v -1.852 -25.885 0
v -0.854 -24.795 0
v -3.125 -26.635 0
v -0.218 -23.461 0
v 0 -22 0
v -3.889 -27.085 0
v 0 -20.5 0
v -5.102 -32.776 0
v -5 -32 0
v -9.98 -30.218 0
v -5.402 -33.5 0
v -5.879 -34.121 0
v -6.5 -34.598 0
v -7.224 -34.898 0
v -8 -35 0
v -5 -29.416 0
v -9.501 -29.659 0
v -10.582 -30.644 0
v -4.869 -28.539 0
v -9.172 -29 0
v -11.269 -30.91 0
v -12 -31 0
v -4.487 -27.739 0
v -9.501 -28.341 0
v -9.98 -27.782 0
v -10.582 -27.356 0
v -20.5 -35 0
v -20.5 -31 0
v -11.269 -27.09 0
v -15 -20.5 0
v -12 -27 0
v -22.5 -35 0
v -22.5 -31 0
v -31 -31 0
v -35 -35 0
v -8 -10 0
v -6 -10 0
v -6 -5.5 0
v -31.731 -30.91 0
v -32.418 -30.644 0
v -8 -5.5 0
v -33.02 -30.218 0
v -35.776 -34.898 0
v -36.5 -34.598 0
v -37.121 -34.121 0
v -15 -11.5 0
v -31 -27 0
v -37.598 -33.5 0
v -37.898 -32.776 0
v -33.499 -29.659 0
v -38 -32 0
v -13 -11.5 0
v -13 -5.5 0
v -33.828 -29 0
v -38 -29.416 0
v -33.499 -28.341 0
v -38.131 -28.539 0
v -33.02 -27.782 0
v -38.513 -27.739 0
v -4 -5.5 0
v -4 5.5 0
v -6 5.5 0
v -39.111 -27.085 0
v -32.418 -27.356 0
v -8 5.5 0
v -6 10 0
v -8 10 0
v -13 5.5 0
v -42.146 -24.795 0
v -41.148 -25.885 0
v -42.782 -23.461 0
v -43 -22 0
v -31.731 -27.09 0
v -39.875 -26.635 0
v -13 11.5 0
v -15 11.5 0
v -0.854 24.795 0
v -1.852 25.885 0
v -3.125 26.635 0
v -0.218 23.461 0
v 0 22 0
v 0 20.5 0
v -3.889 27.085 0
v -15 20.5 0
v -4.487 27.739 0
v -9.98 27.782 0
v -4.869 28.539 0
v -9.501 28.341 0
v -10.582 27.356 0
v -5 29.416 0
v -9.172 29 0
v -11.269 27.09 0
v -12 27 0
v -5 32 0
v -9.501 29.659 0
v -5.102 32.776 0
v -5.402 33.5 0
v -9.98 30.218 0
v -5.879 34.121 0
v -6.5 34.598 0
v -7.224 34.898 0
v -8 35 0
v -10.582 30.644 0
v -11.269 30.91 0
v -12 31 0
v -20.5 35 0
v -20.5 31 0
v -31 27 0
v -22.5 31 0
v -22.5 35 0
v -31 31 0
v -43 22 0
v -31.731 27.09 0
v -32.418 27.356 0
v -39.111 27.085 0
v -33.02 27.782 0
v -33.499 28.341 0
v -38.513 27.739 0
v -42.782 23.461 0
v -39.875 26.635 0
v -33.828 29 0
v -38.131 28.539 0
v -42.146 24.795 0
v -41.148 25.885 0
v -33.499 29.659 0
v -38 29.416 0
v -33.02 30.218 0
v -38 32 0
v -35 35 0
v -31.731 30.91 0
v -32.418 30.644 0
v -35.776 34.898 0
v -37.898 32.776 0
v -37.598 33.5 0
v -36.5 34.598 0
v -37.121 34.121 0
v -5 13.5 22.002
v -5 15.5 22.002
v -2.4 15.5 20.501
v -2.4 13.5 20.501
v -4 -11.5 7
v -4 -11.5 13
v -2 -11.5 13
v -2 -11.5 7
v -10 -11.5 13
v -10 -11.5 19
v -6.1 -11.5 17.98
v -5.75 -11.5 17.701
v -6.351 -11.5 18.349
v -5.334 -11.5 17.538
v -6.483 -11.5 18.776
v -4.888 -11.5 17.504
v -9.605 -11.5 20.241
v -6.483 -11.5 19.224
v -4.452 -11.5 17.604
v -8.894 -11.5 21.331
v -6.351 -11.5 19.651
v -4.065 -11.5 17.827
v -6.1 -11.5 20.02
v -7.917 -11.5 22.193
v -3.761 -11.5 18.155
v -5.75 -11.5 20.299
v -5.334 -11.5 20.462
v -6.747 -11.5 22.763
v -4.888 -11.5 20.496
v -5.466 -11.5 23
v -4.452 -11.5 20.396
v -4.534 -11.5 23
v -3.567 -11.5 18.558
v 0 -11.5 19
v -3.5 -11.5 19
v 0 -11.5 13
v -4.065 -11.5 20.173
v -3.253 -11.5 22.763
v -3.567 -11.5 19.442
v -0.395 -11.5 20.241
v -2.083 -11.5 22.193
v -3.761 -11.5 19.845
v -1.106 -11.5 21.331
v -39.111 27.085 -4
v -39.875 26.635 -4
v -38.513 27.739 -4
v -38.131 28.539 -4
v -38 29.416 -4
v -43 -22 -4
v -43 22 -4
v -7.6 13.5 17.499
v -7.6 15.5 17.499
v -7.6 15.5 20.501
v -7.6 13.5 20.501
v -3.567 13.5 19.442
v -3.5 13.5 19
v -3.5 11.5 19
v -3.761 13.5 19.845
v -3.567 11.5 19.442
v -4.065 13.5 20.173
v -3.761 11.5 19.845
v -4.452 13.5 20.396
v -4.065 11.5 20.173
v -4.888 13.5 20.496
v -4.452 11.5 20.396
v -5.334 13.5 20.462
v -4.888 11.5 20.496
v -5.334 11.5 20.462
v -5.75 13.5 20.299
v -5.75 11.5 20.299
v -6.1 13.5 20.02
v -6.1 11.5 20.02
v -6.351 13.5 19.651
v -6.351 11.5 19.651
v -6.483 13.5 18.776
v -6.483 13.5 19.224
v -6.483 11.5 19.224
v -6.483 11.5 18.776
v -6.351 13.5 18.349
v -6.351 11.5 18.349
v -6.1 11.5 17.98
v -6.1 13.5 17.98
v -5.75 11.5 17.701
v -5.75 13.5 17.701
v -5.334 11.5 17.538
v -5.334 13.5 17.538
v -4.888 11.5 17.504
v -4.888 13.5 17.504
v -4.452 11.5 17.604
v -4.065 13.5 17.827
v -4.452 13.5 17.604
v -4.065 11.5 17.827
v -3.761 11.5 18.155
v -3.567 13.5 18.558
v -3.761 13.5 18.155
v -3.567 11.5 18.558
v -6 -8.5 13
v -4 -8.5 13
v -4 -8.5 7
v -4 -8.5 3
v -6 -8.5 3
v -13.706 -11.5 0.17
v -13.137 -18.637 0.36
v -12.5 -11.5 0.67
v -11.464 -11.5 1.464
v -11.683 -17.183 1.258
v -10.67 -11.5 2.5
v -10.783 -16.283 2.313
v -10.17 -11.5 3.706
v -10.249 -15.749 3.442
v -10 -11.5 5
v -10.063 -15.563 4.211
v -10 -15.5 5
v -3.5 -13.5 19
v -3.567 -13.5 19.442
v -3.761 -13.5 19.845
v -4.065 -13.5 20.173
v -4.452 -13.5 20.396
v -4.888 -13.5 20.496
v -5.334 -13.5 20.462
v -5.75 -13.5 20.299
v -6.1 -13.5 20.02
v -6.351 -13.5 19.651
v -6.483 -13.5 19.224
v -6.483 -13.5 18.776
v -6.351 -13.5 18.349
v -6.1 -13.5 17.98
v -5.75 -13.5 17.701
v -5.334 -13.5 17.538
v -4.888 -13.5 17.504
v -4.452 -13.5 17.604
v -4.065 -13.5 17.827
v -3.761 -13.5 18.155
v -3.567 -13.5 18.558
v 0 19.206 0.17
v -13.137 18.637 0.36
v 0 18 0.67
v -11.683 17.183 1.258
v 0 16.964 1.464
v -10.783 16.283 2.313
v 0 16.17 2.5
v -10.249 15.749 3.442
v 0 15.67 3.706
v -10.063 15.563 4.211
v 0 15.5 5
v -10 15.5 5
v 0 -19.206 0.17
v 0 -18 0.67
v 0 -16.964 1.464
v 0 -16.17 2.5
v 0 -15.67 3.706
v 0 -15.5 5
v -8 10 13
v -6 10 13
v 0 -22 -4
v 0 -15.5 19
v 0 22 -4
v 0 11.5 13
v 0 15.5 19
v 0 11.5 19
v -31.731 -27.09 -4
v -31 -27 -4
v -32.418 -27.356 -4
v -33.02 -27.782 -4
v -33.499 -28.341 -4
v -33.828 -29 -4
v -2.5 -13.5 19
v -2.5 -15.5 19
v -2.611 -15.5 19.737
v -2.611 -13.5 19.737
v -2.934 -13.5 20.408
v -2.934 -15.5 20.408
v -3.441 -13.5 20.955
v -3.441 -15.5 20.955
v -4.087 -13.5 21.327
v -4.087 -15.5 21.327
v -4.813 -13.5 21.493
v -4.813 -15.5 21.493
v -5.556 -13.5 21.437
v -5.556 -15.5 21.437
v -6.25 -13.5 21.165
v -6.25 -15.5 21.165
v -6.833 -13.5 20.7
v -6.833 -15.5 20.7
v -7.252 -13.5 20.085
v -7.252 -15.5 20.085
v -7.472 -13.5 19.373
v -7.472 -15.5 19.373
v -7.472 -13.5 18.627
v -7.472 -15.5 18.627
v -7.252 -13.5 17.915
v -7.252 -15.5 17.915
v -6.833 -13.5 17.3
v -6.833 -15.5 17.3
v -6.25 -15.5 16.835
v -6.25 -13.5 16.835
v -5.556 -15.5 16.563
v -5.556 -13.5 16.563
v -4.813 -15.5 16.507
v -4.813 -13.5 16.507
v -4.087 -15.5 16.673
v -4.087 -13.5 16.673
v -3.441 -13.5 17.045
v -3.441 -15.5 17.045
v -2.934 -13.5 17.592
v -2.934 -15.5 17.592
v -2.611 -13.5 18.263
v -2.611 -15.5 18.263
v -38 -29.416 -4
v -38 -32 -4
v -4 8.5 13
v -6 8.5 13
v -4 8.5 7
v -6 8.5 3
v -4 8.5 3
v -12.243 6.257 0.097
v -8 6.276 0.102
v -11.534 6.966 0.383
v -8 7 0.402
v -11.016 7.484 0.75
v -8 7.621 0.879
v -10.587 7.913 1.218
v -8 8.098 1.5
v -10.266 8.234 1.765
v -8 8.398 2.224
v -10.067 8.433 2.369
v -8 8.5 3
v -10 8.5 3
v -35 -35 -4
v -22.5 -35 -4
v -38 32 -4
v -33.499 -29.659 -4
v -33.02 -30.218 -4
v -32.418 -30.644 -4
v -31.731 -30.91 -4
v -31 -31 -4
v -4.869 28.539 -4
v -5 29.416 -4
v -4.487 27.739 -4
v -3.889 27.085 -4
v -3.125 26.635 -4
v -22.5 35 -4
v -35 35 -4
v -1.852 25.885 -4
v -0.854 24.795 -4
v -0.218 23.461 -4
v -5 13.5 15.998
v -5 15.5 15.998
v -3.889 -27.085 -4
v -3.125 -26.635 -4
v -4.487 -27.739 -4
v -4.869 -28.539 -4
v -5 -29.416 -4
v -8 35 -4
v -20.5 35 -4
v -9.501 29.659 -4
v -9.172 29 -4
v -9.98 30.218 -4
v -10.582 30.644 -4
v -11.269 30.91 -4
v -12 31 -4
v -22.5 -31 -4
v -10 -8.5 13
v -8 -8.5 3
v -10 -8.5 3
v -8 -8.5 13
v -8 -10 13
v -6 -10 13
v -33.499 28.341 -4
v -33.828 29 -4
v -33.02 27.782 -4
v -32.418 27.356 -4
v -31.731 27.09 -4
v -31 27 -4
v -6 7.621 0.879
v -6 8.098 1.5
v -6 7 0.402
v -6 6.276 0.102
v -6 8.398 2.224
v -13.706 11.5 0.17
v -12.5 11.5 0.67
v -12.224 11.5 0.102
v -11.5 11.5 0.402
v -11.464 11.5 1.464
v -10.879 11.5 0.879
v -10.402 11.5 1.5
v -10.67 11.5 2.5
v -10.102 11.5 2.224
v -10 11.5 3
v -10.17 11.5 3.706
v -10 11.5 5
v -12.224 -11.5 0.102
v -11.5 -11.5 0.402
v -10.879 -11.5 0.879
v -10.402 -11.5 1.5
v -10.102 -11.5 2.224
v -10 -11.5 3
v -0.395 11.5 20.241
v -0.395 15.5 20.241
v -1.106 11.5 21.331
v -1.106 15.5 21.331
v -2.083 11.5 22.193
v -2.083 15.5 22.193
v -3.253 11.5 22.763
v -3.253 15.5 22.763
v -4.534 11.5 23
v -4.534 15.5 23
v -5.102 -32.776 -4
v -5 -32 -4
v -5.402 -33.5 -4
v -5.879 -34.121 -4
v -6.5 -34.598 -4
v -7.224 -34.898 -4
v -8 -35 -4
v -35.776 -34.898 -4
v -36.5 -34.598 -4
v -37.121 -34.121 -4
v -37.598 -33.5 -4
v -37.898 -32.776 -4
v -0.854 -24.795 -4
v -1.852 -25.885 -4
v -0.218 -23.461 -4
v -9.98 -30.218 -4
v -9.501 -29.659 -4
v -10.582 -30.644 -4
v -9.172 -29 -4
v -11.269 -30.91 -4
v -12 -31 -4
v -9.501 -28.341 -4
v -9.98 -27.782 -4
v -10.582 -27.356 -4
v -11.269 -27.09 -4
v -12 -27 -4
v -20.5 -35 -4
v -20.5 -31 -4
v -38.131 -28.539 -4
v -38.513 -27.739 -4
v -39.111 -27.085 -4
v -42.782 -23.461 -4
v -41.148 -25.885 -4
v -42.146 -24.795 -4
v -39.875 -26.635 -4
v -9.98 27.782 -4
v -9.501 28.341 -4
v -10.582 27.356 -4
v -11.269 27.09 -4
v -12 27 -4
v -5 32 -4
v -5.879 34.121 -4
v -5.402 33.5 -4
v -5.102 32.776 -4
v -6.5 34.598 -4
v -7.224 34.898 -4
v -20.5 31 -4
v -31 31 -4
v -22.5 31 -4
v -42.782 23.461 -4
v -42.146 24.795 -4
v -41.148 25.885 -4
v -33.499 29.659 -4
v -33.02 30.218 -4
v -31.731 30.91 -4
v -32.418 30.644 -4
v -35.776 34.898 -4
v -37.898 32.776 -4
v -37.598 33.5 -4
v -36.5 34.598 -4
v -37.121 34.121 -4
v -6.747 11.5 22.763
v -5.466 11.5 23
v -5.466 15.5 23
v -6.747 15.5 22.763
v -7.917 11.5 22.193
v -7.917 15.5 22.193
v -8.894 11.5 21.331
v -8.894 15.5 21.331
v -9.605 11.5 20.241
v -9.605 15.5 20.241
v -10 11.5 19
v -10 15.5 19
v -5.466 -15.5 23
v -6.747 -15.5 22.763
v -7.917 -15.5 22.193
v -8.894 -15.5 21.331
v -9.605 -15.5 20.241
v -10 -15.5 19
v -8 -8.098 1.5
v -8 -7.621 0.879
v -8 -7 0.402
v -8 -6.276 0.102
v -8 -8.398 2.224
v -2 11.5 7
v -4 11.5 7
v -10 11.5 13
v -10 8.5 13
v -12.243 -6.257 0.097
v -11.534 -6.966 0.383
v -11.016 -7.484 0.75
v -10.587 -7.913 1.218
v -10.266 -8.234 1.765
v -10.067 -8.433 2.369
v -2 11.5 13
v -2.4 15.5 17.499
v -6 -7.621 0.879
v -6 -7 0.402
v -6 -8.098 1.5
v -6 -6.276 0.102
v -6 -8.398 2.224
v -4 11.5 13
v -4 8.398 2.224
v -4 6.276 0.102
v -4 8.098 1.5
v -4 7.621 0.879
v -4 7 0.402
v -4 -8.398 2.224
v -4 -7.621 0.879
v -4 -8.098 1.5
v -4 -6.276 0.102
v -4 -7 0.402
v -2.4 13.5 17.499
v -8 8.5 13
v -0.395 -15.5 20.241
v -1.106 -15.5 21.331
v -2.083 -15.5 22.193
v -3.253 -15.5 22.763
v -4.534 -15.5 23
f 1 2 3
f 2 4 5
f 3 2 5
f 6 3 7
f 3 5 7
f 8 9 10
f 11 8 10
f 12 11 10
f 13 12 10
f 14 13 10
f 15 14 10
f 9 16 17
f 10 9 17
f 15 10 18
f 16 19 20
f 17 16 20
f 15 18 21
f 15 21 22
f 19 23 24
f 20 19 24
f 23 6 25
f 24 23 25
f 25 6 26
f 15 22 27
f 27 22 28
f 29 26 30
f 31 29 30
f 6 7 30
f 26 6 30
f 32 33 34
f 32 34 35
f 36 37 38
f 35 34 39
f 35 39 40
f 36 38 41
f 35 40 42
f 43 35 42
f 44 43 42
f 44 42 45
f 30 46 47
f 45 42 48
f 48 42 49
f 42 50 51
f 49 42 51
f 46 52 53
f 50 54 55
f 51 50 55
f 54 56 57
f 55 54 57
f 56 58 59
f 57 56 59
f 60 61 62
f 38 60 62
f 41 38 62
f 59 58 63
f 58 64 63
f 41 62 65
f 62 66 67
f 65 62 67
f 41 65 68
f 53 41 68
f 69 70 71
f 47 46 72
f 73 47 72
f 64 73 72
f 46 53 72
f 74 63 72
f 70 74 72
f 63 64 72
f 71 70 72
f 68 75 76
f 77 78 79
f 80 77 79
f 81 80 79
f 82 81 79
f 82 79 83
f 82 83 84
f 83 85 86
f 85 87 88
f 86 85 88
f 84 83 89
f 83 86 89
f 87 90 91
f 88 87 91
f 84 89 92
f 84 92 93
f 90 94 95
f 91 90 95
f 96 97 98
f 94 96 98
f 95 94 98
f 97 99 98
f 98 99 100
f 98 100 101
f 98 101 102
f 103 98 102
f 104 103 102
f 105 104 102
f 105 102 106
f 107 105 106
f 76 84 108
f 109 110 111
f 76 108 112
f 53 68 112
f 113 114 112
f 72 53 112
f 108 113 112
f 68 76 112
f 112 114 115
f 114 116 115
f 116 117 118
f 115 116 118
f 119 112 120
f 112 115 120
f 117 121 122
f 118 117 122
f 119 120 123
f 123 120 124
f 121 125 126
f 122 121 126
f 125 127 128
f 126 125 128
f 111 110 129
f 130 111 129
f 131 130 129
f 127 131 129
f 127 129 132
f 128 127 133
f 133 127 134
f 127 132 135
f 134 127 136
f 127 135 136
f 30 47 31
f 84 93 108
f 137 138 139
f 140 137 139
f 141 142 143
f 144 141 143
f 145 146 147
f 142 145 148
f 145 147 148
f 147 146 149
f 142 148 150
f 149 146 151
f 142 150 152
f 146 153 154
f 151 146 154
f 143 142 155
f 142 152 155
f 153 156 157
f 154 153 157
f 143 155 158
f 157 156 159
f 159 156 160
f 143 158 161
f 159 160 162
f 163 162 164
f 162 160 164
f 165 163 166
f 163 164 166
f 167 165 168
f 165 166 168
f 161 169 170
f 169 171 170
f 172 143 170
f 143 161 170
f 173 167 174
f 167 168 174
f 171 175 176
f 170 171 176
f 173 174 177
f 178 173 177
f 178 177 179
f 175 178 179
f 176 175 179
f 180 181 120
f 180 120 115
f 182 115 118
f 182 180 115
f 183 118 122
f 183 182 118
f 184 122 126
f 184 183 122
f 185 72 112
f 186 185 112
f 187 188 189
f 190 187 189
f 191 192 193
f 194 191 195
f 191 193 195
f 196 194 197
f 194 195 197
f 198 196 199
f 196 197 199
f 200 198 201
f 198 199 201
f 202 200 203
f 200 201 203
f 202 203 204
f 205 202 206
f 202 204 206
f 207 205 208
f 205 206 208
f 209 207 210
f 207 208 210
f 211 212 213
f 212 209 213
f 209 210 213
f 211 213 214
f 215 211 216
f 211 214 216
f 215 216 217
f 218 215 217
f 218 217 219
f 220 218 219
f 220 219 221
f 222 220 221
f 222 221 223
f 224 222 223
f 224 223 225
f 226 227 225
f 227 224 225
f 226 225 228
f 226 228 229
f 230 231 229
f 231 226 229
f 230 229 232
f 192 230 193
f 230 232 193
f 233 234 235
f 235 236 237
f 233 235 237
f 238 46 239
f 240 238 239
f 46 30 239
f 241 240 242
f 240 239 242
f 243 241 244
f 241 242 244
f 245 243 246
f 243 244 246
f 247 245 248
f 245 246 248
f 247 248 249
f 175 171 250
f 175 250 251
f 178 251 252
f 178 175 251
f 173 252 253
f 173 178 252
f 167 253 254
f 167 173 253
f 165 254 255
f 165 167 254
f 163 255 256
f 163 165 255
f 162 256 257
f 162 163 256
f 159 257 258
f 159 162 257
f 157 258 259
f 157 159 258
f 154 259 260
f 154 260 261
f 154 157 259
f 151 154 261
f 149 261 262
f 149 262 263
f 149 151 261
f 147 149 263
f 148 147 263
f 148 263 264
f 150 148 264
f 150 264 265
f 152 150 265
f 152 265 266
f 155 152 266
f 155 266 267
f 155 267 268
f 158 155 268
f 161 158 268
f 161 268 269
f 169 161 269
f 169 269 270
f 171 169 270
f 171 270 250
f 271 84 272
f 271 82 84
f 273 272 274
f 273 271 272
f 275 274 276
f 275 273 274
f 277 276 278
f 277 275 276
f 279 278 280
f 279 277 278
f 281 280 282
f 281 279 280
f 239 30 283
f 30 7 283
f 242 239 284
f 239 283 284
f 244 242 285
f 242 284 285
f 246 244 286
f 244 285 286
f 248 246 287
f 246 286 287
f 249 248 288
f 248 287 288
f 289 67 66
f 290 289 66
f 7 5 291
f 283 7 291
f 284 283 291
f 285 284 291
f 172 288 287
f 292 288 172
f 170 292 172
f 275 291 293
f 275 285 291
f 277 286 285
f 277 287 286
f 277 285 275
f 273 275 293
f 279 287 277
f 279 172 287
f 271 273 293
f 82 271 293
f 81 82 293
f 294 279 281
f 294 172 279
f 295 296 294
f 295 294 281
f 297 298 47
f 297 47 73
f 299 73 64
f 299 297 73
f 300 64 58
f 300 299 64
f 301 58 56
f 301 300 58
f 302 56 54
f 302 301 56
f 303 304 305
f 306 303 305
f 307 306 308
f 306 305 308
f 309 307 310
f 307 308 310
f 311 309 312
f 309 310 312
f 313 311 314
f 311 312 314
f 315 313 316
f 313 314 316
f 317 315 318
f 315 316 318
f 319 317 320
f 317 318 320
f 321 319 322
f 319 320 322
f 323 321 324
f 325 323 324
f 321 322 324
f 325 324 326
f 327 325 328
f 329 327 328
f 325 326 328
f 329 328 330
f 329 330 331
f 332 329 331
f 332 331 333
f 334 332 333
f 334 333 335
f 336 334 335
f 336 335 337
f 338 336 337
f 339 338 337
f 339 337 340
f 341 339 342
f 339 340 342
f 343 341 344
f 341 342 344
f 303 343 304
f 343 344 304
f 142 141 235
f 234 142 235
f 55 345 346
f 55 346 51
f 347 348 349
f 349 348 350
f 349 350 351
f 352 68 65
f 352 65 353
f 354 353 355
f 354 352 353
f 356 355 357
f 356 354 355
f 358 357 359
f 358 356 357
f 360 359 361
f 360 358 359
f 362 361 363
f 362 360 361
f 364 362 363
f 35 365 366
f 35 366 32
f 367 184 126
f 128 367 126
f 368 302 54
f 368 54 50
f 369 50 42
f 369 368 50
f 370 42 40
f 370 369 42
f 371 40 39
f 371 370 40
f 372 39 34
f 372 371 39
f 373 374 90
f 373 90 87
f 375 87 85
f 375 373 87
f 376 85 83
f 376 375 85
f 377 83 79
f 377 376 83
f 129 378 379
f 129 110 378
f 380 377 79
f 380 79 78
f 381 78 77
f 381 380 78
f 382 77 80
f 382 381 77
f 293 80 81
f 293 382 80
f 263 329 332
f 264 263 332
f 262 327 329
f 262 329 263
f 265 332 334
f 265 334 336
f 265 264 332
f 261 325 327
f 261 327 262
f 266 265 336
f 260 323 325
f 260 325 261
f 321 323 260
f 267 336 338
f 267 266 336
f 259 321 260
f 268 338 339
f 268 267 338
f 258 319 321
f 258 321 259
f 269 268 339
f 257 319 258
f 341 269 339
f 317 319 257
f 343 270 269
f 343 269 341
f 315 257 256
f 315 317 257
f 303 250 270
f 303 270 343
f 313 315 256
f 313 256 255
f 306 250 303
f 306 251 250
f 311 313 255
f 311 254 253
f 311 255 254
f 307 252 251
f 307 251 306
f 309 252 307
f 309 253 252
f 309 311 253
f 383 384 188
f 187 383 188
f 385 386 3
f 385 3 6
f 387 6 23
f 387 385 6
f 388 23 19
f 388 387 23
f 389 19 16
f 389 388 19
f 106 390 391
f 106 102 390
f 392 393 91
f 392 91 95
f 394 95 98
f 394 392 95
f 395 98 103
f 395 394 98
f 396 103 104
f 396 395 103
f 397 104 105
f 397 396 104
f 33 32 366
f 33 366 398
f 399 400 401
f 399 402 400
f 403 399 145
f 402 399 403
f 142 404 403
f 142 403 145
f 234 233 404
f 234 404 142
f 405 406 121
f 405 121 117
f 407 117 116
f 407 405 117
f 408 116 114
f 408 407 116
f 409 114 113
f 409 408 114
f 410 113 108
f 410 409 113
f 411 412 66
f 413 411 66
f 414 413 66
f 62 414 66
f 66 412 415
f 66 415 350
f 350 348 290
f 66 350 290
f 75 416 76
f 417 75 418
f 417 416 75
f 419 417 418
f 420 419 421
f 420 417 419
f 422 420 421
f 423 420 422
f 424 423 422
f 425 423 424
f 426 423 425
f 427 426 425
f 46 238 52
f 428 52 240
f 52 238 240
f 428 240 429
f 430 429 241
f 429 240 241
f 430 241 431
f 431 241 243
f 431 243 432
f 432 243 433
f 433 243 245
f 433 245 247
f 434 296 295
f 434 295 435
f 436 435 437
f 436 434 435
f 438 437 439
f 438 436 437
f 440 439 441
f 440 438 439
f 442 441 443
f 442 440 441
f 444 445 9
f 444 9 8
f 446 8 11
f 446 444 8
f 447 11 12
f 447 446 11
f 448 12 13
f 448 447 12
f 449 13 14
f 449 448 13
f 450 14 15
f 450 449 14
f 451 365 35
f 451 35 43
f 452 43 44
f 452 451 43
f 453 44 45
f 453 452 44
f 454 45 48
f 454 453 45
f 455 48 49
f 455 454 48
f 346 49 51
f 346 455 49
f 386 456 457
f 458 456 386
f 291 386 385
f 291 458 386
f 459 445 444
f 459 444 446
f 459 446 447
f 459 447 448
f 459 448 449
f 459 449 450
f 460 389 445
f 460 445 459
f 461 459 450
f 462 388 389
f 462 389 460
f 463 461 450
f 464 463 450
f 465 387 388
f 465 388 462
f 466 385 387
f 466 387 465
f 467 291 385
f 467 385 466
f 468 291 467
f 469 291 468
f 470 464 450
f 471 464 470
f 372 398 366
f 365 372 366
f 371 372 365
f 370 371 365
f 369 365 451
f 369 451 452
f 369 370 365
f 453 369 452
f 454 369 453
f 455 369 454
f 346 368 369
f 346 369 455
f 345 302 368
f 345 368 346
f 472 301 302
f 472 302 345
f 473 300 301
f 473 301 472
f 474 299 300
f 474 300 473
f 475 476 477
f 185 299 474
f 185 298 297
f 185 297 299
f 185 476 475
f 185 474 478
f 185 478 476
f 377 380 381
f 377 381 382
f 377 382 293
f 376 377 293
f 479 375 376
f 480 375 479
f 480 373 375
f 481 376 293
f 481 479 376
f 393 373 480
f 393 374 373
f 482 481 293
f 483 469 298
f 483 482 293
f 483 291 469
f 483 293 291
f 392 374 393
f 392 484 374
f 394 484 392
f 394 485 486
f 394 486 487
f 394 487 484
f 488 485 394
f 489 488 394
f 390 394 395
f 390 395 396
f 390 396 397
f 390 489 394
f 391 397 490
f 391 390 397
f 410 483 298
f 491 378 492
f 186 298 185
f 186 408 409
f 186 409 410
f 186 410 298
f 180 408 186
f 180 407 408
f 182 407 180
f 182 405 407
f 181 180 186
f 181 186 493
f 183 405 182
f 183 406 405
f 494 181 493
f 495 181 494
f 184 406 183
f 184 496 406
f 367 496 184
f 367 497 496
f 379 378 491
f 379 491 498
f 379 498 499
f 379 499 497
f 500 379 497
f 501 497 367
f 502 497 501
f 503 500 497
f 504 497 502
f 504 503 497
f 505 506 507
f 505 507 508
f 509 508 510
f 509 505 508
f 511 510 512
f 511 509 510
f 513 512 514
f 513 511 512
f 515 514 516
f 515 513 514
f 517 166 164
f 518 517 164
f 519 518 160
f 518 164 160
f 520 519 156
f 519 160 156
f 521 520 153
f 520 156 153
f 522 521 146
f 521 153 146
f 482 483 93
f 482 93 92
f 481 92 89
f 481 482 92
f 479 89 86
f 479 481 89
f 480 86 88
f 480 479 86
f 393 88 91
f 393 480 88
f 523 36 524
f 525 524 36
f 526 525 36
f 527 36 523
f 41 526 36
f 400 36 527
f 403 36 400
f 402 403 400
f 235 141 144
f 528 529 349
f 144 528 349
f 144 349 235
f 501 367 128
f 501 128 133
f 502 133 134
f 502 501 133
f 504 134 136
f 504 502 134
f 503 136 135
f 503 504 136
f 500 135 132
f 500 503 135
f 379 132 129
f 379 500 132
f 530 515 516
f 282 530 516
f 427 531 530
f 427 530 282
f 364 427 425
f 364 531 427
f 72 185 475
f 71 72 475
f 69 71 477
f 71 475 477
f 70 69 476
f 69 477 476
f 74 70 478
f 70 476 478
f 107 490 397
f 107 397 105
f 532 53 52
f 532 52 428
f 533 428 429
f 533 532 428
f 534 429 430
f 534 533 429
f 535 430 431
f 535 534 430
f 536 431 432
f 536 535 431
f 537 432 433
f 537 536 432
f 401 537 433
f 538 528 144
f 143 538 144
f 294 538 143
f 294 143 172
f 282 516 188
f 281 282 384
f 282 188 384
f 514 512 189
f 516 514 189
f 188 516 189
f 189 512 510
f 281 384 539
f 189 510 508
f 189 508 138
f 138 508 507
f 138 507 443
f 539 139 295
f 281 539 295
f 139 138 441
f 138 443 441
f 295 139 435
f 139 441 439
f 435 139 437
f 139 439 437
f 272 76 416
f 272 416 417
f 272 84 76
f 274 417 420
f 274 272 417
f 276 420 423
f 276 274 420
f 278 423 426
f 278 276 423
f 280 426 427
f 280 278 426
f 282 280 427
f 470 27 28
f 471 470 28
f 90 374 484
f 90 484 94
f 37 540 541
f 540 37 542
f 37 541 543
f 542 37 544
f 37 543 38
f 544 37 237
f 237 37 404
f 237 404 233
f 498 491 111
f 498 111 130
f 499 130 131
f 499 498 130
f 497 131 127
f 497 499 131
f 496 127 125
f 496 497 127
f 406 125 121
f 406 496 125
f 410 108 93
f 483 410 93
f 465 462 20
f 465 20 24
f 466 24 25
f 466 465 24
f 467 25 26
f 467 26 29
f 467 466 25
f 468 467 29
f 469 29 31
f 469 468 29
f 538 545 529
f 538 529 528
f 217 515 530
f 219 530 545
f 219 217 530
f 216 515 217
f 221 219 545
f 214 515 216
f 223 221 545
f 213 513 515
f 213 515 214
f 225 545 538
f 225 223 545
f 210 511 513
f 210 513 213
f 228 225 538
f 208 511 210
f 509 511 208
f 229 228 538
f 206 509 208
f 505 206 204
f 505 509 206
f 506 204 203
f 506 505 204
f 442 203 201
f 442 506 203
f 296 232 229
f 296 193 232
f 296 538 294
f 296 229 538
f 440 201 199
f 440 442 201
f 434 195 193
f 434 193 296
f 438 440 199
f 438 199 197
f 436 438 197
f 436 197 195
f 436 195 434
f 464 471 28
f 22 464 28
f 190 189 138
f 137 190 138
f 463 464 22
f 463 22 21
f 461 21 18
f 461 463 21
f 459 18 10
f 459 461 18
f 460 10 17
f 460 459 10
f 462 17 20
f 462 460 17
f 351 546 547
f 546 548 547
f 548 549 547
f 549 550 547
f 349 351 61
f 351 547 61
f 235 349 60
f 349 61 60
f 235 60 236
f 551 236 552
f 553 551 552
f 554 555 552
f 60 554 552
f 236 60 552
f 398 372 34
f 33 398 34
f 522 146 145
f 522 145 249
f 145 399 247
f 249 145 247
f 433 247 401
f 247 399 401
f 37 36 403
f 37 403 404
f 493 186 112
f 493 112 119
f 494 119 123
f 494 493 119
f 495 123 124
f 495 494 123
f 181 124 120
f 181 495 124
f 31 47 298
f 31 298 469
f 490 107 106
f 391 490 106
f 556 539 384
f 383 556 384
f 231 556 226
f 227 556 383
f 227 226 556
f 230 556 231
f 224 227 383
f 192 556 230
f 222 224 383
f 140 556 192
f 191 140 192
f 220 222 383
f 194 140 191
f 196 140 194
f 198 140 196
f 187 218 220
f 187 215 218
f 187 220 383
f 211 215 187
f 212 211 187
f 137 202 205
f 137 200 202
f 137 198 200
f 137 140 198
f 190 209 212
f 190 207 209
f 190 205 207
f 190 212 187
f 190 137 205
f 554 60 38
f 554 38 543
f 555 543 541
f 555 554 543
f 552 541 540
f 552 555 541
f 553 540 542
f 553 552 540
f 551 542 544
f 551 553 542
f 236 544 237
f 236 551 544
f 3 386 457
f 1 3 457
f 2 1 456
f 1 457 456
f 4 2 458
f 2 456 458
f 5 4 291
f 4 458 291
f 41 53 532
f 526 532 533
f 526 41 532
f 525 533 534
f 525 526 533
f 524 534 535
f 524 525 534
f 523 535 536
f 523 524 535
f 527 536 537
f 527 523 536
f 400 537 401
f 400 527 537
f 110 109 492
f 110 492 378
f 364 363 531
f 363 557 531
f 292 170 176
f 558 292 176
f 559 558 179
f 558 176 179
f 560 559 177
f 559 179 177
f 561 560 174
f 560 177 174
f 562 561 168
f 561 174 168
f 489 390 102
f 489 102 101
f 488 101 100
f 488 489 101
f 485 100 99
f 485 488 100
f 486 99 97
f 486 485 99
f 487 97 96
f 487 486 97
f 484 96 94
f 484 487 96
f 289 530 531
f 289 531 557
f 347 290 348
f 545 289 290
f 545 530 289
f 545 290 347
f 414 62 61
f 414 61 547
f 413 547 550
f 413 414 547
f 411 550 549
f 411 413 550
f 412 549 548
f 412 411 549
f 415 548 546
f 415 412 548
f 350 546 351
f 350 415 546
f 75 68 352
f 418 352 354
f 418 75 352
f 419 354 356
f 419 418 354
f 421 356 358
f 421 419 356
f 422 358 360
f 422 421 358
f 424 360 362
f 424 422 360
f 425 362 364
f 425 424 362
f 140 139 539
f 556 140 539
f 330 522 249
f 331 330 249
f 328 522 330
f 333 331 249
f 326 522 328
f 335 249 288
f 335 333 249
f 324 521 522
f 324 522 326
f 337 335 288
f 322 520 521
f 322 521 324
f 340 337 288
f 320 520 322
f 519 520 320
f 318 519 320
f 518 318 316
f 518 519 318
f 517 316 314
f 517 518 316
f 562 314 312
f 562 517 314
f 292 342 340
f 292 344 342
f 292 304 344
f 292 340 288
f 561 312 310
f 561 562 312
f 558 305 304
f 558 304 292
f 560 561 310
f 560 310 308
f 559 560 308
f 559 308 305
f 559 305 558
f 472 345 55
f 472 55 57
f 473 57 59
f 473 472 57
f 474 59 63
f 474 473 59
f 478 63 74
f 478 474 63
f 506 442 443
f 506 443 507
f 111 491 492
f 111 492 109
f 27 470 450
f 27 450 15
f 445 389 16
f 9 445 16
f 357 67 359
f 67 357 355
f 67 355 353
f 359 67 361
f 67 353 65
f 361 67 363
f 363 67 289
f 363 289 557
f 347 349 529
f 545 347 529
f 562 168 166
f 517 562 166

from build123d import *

# Parameters (mm, degrees)
F1_R          = 1.5
F2_DEPTH      = 4
F4_W          = 43
F4_H          = 54
F5_DEPTH      = 4
F6_R          = 5
F7_W          = 4
F7_H          = 4
F8_DEPTH      = 8
F8_DEPTH_BACK = 62
F9_W          = 4
F9_H          = 4
F10_DEPTH     = 25
F11_W         = 2
F11_H         = 4
F12_DEPTH     = 5
F11_H_2       = 15
F11_H_3       = 8
F11_H_4       = 1.5
F13_DEPTH     = 13
F14_DEPTH     = 7
F15_T1_DEPTH  = 3
F15_T3_DEPTH  = 3
F15_T5_DEPTH  = 2
F15_T7_DEPTH  = 4
F15_T12_DEPTH = 17
F15_T17_DEPTH = 17
F15_T22_DEPTH = 17
F15_T28_DEPTH = 9.5
F15_T33_DEPTH = 9.5
F15_T38_DEPTH = 17
F15_T45_DEPTH = 9.5
F15_T49_DEPTH = 10.5
F15_T56_DEPTH = 10.5
F15_T60_DEPTH = 9.5
F15_T63_DEPTH = 19
F16_R         = 2.5
F16_R_2       = 1.5
F17_DEPTH     = 2
F18_R         = 1.5
F19_DEPTH     = 2


# Not quite as in the source:
# - a fillet or chamfer that OpenCascade refuses, or shapes differently, is made with other operations: its cross-section is extruded or revolved along the edge and cut away or added


with BuildPart() as f2:
    # F1 (on offset) → F2 (new body)
    with BuildSketch(Plane.XZ.offset(11.5)):
        with BuildLine():
            Line((-10, 0), (0, 0))
            Line((0, 0), (0, 19))
            ThreePointArc((0, 19), (-1.5652731311, 21.7951628703), (-4.5336704997, 23))
            Line((-4.5336704997, 23), (-5, 23))
            Line((-5, 23), (-5.4663295003, 23))
            ThreePointArc((-5.4663295003, 23), (-8.4347268689, 21.7951628703), (-10, 19))
            Line((-10, 19), (-10, 0))
        make_face()
        with Locations((-5, 19)):
            Circle(F1_R, mode=Mode.SUBTRACT)
    extrude(amount=F2_DEPTH)


with BuildPart() as f3_1:
    # F3: instance of F2
    add(f2.part.mirror(Plane.XZ))


with BuildPart() as f2_1:
    add(f2.part)

    add(f3_1.part)  # F5 merges F3_1
    # F4 (on Top) → F5 (join)
    with BuildSketch(Plane.XY):
        with Locations((-21.5, 0)):
            Rectangle(F4_W, F4_H)
    extrude(amount=-F5_DEPTH)

    # F6
    f6_edges = [f2_1.edges().sort_by_distance(p)[0] for p in [
        (-5, -15.5, 0),
        (-5, 15.5, 0),
        (-10, 13.5, 0),
        (-10, -13.5, 0),
        (-43, 27, -2),
        (-43, -27, -2),
        (0, -27, -2),
        (0, 27, -2),
    ]]
    fillet(f6_edges, radius=F6_R)

    # F7 (on face) → F8 (join, two sides)
    with BuildSketch(Plane(origin=(0, 27, 0), x_dir=(-1, 0, 0), z_dir=(0, 1, 0))) as f8_sk:
        with Locations((36, -2)):
            Rectangle(F7_W, F7_H)
        with Locations((7, -2)):
            Rectangle(F7_W, F7_H)
    extrude(amount=F8_DEPTH)
    extrude(f8_sk.sketch, amount=-F8_DEPTH_BACK)

    # F9 (on face) → F10 (join)
    with BuildSketch(Plane.YZ.offset(-34)):
        with Locations((-33, -2)):
            Rectangle(F9_W, F9_H)
        with Locations((33, -2)):
            Rectangle(F9_W, F9_H)
    extrude(amount=F10_DEPTH)

    # F11 (on face) → F12 (cut)
    with BuildSketch(Plane.XY):
        with Locations((-21.5, -33)):
            Rectangle(F11_W, F11_H)
        with Locations((-21.5, 33)):
            Rectangle(F11_W, F11_H)
    extrude(amount=-F12_DEPTH, mode=Mode.SUBTRACT)

    # F11 (on face) → F13 (join)
    with BuildSketch(Plane.XY):
        with Locations((-1, 4)):
            Rectangle(F11_W, F11_H_2)
        with Locations((-1, -7.5)):
            Rectangle(F11_W, F11_H_3)
        Polygon((-6, -10), (-6, -11.5), (-4, -11.5), (-4, -8.5), (-6, -8.5), align=None)
        with Locations((-7, -10.75)):
            Rectangle(F11_W, F11_H_4)
        Polygon((-10, -8.5), (-10, -11.5), (-8, -11.5), (-8, -10), (-8, -8.5), align=None)
        Polygon((-8, 11.5), (-10, 11.5), (-10, 8.5), (-8, 8.5), (-8, 10), align=None)
        with Locations((-7, 10.75)):
            Rectangle(F11_W, F11_H_4)
        Polygon((-6, 8.5), (-4, 8.5), (-4, 11.5), (-6, 11.5), (-6, 10), align=None)
    extrude(amount=F13_DEPTH)

    # F11 (on face) → F14 (join)
    with BuildSketch(Plane.XY):
        Polygon((-4, -8.5), (-4, -11.5), (-2, -11.5), (-2, -3.5), (-2, 11.5), (-4, 11.5), (-4, 8.5), align=None)
    extrude(amount=F14_DEPTH)

    # F15: fillet of radius 3 on 22 edges, made by hand

    # F15_s2 → F15_t1 (join)
    with BuildSketch(Plane.XZ.offset(8.5)):
        with BuildLine():
            ThreePointArc((-13, 0), (-10.8786796564, 0.8786796564), (-10, 3))
            Line((-10, 3), (-10, 0))
            Line((-10, 0), (-13, 0))
        make_face()
    extrude(amount=F15_T1_DEPTH)

    # F15_s4 → F15_t3 (join)
    with BuildSketch(Plane.XZ.offset(-11.5)):
        with BuildLine():
            ThreePointArc((-13, 0), (-10.8786796564, 0.8786796564), (-10, 3))
            Line((-10, 3), (-10, 0))
            Line((-10, 0), (-13, 0))
        make_face()
    extrude(amount=F15_T3_DEPTH)

    # F15_s6 → F15_t5 (join)
    with BuildSketch(Plane.YZ.offset(-10)):
        with BuildLine():
            ThreePointArc((-5.5, 0), (-7.6213203436, 0.8786796564), (-8.5, 3))
            Line((-8.5, 3), (-8.5, 0))
            Line((-8.5, 0), (-5.5, 0))
        make_face()
        with BuildLine():
            ThreePointArc((5.5, 0), (7.6213203436, 0.8786796564), (8.5, 3))
            Line((8.5, 3), (8.5, 0))
            Line((8.5, 0), (5.5, 0))
        make_face()
    extrude(amount=F15_T5_DEPTH)

    # F15_s8 → F15_t7 (join)
    with BuildSketch(Plane.XY.offset(-4)):
        with BuildLine():
            ThreePointArc((-9, -30), (-9.8786796564, -27.8786796564), (-12, -27))
            Line((-12, -27), (-9, -27))
            Line((-9, -27), (-9, -30))
        make_face()
        with BuildLine():
            ThreePointArc((-31, -27), (-33.1213203436, -27.8786796564), (-34, -30))
            Line((-34, -30), (-34, -27))
            Line((-34, -27), (-31, -27))
        make_face()
        with BuildLine():
            ThreePointArc((-34, -28), (-33.1213203436, -30.1213203436), (-31, -31))
            Line((-31, -31), (-34, -31))
            Line((-34, -31), (-34, -28))
        make_face()
        with BuildLine():
            ThreePointArc((-12, -31), (-9.8786796564, -30.1213203436), (-9, -28))
            Line((-9, -28), (-9, -31))
            Line((-9, -31), (-12, -31))
        make_face()
        with BuildLine():
            ThreePointArc((-38, -29.4161984871), (-38.5125314072, -27.739147504), (-39.875, -26.6351240544))
            ThreePointArc((-39.875, -26.6351240544), (-38.9550863123, -26.9079333875), (-38, -27))
            Line((-38, -27), (-38, -29.4161984871))
        make_face()
        with BuildLine():
            ThreePointArc((-3.125, -26.6351240544), (-4.4874685928, -27.739147504), (-5, -29.4161984871))
            Line((-5, -29.4161984871), (-5, -27))
            ThreePointArc((-5, -27), (-4.0449136877, -26.9079333875), (-3.125, -26.6351240544))
        make_face()
        with BuildLine():
            ThreePointArc((-39.875, 26.6351240544), (-38.5125314072, 27.739147504), (-38, 29.4161984871))
            Line((-38, 29.4161984871), (-38, 27))
            ThreePointArc((-38, 27), (-38.9550863123, 26.9079333875), (-39.875, 26.6351240544))
        make_face()
        with BuildLine():
            ThreePointArc((-12, 27), (-9.8786796564, 27.8786796564), (-9, 30))
            Line((-9, 30), (-9, 27))
            Line((-9, 27), (-12, 27))
        make_face()
        with BuildLine():
            ThreePointArc((-5, 29.4161984871), (-4.4874685928, 27.739147504), (-3.125, 26.6351240544))
            ThreePointArc((-3.125, 26.6351240544), (-4.0449136877, 26.9079333875), (-5, 27))
            Line((-5, 27), (-5, 29.4161984871))
        make_face()
        with BuildLine():
            ThreePointArc((-34, 30), (-33.1213203436, 27.8786796564), (-31, 27))
            Line((-31, 27), (-34, 27))
            Line((-34, 27), (-34, 30))
        make_face()
        with BuildLine():
            ThreePointArc((-31, 31), (-33.1213203436, 30.1213203436), (-34, 28))
            Line((-34, 28), (-34, 31))
            Line((-34, 31), (-31, 31))
        make_face()
        with BuildLine():
            ThreePointArc((-9, 28), (-9.8786796564, 30.1213203436), (-12, 31))
            Line((-12, 31), (-9, 31))
            Line((-9, 31), (-9, 28))
        make_face()
    extrude(amount=F15_T7_DEPTH)


with BuildPart() as f15_tool10:
    # F15_s11 → F15_t12 (new body)
    with BuildSketch(Plane.YZ.offset(-0.5)):
        with BuildLine():
            ThreePointArc((-5.5, 0), (-7.6213203436, 0.8786796564), (-8.5, 3))
            Line((-8.5, 3), (-8.5, 0))
            Line((-8.5, 0), (-5.5, 0))
        make_face()
    extrude(amount=-F15_T12_DEPTH)

    split(bisect_by=Plane.YZ.offset(-6), keep=Keep.TOP)


with BuildPart() as f2_2:
    add(f2_1.part)

    # F15_t9: union F15_tool10
    add(f15_tool10.part)


with BuildPart() as f15_tool15:
    # F15_s16 → F15_t17 (new body)
    with BuildSketch(Plane.YZ.offset(-17.5)):
        with BuildLine():
            ThreePointArc((5.5, 0), (7.6213203436, 0.8786796564), (8.5, 3))
            Line((8.5, 3), (8.5, 0))
            Line((8.5, 0), (5.5, 0))
        make_face()
    extrude(amount=F15_T17_DEPTH)

    split(bisect_by=Plane.YZ.offset(-6), keep=Keep.TOP)


with BuildPart() as f2_3:
    add(f2_2.part)

    # F15_t14: union F15_tool15
    add(f15_tool15.part)


with BuildPart() as f15_tool20:
    # F15_s21 → F15_t22 (new body)
    with BuildSketch(Plane.YZ.offset(-13.5)):
        with BuildLine():
            ThreePointArc((5.5, 0), (7.6213203436, 0.8786796564), (8.5, 3))
            Line((8.5, 3), (8.5, 0))
            Line((8.5, 0), (5.5, 0))
        make_face()
    extrude(amount=F15_T22_DEPTH)

    split(bisect_by=Plane.YZ.offset(-10), keep=Keep.TOP)

    split(bisect_by=Plane.YZ.offset(-8), keep=Keep.BOTTOM)


with BuildPart() as f2_4:
    add(f2_3.part)

    # F15_t19: union F15_tool20
    add(f15_tool20.part)


with BuildPart() as f15_tool26:
    # F15_s27 → F15_t28 (new body)
    with BuildSketch(Plane.YZ.offset(-6)):
        with BuildLine():
            ThreePointArc((5.5, 0), (7.6213203436, 0.8786796564), (8.5, 3))
            Line((8.5, 3), (8.5, 0))
            Line((8.5, 0), (5.5, 0))
        make_face()
    extrude(amount=F15_T28_DEPTH)

    split(bisect_by=Plane.YZ, keep=Keep.BOTTOM)


with BuildPart() as f2_5:
    add(f2_4.part)

    # F15_t25: union F15_tool26
    add(f15_tool26.part)


with BuildPart() as f15_tool31:
    # F15_s32 → F15_t33 (new body)
    with BuildSketch(Plane.YZ.offset(3.5)):
        with BuildLine():
            ThreePointArc((-5.5, 0), (-7.6213203436, 0.8786796564), (-8.5, 3))
            Line((-8.5, 3), (-8.5, 0))
            Line((-8.5, 0), (-5.5, 0))
        make_face()
    extrude(amount=-F15_T33_DEPTH)

    split(bisect_by=Plane.YZ, keep=Keep.BOTTOM)


with BuildPart() as f2_6:
    add(f2_5.part)

    # F15_t30: union F15_tool31
    add(f15_tool31.part)


with BuildPart() as f15_tool36:
    # F15_s37 → F15_t38 (new body)
    with BuildSketch(Plane.YZ.offset(3.5)):
        with BuildLine():
            ThreePointArc((-5.5, 0), (-7.6213203436, 0.8786796564), (-8.5, 3))
            Line((-8.5, 3), (-8.5, 0))
            Line((-8.5, 0), (-5.5, 0))
        make_face()
    extrude(amount=-F15_T38_DEPTH)

    split(bisect_by=Plane.YZ.offset(-8), keep=Keep.BOTTOM)

    split(bisect_by=Plane.YZ.offset(-10), keep=Keep.TOP)


with BuildPart() as f2_7:
    add(f2_6.part)

    # F15_t35: union F15_tool36
    add(f15_tool36.part)


with BuildPart() as f15_tool43:
    # F15_s44 → F15_t45 (new body)
    with BuildSketch(Plane.YZ.offset(-8)):
        with BuildLine():
            ThreePointArc((-5.5, 0), (-7.6213203436, 0.8786796564), (-8.5, 3))
            Line((-8.5, 3), (-8.5, 0))
            Line((-8.5, 0), (-5.5, 0))
        make_face()
    extrude(amount=-F15_T45_DEPTH)

    split(bisect_by=Plane.YZ.offset(-10), keep=Keep.BOTTOM)


with BuildPart() as f15_tool47:
    # F15_s48 → F15_t49 (new body)
    with BuildSketch(Plane.XZ.offset(1)):
        with BuildLine():
            ThreePointArc((-13, 0), (-10.8786796564, 0.8786796564), (-10, 3))
            Line((-10, 3), (-10, 0))
            Line((-10, 0), (-13, 0))
        make_face()
    extrude(amount=F15_T49_DEPTH)

    split(bisect_by=Plane.XZ.offset(8.5), keep=Keep.BOTTOM)


with BuildPart() as f15_tool43_1:
    add(f15_tool43.part)

    # F15_t51: intersect F15_tool47
    add(f15_tool47.part, mode=Mode.INTERSECT)


with BuildPart() as f2_8:
    add(f2_7.part)

    # F15_t41: union F15_tool43
    add(f15_tool43_1.part)


with BuildPart() as f15_tool54:
    # F15_s55 → F15_t56 (new body)
    with BuildSketch(Plane.XZ.offset(-11.5)):
        with BuildLine():
            ThreePointArc((-13, 0), (-10.8786796564, 0.8786796564), (-10, 3))
            Line((-10, 3), (-10, 0))
            Line((-10, 0), (-13, 0))
        make_face()
    extrude(amount=F15_T56_DEPTH)

    split(bisect_by=Plane.XZ.offset(-8.5), keep=Keep.TOP)


with BuildPart() as f15_tool58:
    # F15_s59 → F15_t60 (new body)
    with BuildSketch(Plane.YZ.offset(-17.5)):
        with BuildLine():
            ThreePointArc((5.5, 0), (7.6213203436, 0.8786796564), (8.5, 3))
            Line((8.5, 3), (8.5, 0))
            Line((8.5, 0), (5.5, 0))
        make_face()
    extrude(amount=F15_T60_DEPTH)

    split(bisect_by=Plane.YZ.offset(-10), keep=Keep.BOTTOM)


with BuildPart() as f15_tool54_1:
    add(f15_tool54.part)

    # F15_t62: intersect F15_tool58
    add(f15_tool58.part, mode=Mode.INTERSECT)


with BuildPart() as f2_9:
    add(f2_8.part)

    # F15_t52: union F15_tool54
    add(f15_tool54_1.part)

    # F15_s64 → F15_t63 (cut)
    with BuildSketch(Plane.XY.offset(-11.5)):
        with BuildLine():
            ThreePointArc((-5, -32), (-5.8786796564, -34.1213203436), (-8, -35))
            Line((-8, -35), (-5, -35))
            Line((-5, -35), (-5, -32))
        make_face()
        with BuildLine():
            ThreePointArc((-35, -35), (-37.1213203436, -34.1213203436), (-38, -32))
            Line((-38, -32), (-38, -35))
            Line((-38, -35), (-35, -35))
        make_face()
        with BuildLine():
            ThreePointArc((-38, 32), (-37.1213203436, 34.1213203436), (-35, 35))
            Line((-35, 35), (-38, 35))
            Line((-38, 35), (-38, 32))
        make_face()
        with BuildLine():
            ThreePointArc((-8, 35), (-5.8786796564, 34.1213203436), (-5, 32))
            Line((-5, 32), (-5, 35))
            Line((-5, 35), (-8, 35))
        make_face()
    extrude(amount=F15_T63_DEPTH, mode=Mode.SUBTRACT)

    # F16 (on face) → F17 (cut)
    with BuildSketch(Plane.XZ.offset(15.5)):
        with Locations((-5, 19)):
            Circle(F16_R)
        with Locations((-5, 19)):
            Circle(F16_R_2, mode=Mode.SUBTRACT)
    extrude(amount=-F17_DEPTH, mode=Mode.SUBTRACT)

    # F18 (on face) → F19 (cut)
    with BuildSketch(Plane(origin=(0, 15.5, 0), x_dir=(-1, 0, 0), z_dir=(0, 1, 0))):
        Polygon((7.6, 17.4988893001), (7.6, 20.5011106999), (5, 22.0022213998), (2.4, 20.5011106999), (2.4, 17.4988893001), (5, 15.9977786002), align=None)
        with Locations((5, 19)):
            Circle(F18_R, mode=Mode.SUBTRACT)
    extrude(amount=-F19_DEPTH, mode=Mode.SUBTRACT)


solid = f2_9.part
